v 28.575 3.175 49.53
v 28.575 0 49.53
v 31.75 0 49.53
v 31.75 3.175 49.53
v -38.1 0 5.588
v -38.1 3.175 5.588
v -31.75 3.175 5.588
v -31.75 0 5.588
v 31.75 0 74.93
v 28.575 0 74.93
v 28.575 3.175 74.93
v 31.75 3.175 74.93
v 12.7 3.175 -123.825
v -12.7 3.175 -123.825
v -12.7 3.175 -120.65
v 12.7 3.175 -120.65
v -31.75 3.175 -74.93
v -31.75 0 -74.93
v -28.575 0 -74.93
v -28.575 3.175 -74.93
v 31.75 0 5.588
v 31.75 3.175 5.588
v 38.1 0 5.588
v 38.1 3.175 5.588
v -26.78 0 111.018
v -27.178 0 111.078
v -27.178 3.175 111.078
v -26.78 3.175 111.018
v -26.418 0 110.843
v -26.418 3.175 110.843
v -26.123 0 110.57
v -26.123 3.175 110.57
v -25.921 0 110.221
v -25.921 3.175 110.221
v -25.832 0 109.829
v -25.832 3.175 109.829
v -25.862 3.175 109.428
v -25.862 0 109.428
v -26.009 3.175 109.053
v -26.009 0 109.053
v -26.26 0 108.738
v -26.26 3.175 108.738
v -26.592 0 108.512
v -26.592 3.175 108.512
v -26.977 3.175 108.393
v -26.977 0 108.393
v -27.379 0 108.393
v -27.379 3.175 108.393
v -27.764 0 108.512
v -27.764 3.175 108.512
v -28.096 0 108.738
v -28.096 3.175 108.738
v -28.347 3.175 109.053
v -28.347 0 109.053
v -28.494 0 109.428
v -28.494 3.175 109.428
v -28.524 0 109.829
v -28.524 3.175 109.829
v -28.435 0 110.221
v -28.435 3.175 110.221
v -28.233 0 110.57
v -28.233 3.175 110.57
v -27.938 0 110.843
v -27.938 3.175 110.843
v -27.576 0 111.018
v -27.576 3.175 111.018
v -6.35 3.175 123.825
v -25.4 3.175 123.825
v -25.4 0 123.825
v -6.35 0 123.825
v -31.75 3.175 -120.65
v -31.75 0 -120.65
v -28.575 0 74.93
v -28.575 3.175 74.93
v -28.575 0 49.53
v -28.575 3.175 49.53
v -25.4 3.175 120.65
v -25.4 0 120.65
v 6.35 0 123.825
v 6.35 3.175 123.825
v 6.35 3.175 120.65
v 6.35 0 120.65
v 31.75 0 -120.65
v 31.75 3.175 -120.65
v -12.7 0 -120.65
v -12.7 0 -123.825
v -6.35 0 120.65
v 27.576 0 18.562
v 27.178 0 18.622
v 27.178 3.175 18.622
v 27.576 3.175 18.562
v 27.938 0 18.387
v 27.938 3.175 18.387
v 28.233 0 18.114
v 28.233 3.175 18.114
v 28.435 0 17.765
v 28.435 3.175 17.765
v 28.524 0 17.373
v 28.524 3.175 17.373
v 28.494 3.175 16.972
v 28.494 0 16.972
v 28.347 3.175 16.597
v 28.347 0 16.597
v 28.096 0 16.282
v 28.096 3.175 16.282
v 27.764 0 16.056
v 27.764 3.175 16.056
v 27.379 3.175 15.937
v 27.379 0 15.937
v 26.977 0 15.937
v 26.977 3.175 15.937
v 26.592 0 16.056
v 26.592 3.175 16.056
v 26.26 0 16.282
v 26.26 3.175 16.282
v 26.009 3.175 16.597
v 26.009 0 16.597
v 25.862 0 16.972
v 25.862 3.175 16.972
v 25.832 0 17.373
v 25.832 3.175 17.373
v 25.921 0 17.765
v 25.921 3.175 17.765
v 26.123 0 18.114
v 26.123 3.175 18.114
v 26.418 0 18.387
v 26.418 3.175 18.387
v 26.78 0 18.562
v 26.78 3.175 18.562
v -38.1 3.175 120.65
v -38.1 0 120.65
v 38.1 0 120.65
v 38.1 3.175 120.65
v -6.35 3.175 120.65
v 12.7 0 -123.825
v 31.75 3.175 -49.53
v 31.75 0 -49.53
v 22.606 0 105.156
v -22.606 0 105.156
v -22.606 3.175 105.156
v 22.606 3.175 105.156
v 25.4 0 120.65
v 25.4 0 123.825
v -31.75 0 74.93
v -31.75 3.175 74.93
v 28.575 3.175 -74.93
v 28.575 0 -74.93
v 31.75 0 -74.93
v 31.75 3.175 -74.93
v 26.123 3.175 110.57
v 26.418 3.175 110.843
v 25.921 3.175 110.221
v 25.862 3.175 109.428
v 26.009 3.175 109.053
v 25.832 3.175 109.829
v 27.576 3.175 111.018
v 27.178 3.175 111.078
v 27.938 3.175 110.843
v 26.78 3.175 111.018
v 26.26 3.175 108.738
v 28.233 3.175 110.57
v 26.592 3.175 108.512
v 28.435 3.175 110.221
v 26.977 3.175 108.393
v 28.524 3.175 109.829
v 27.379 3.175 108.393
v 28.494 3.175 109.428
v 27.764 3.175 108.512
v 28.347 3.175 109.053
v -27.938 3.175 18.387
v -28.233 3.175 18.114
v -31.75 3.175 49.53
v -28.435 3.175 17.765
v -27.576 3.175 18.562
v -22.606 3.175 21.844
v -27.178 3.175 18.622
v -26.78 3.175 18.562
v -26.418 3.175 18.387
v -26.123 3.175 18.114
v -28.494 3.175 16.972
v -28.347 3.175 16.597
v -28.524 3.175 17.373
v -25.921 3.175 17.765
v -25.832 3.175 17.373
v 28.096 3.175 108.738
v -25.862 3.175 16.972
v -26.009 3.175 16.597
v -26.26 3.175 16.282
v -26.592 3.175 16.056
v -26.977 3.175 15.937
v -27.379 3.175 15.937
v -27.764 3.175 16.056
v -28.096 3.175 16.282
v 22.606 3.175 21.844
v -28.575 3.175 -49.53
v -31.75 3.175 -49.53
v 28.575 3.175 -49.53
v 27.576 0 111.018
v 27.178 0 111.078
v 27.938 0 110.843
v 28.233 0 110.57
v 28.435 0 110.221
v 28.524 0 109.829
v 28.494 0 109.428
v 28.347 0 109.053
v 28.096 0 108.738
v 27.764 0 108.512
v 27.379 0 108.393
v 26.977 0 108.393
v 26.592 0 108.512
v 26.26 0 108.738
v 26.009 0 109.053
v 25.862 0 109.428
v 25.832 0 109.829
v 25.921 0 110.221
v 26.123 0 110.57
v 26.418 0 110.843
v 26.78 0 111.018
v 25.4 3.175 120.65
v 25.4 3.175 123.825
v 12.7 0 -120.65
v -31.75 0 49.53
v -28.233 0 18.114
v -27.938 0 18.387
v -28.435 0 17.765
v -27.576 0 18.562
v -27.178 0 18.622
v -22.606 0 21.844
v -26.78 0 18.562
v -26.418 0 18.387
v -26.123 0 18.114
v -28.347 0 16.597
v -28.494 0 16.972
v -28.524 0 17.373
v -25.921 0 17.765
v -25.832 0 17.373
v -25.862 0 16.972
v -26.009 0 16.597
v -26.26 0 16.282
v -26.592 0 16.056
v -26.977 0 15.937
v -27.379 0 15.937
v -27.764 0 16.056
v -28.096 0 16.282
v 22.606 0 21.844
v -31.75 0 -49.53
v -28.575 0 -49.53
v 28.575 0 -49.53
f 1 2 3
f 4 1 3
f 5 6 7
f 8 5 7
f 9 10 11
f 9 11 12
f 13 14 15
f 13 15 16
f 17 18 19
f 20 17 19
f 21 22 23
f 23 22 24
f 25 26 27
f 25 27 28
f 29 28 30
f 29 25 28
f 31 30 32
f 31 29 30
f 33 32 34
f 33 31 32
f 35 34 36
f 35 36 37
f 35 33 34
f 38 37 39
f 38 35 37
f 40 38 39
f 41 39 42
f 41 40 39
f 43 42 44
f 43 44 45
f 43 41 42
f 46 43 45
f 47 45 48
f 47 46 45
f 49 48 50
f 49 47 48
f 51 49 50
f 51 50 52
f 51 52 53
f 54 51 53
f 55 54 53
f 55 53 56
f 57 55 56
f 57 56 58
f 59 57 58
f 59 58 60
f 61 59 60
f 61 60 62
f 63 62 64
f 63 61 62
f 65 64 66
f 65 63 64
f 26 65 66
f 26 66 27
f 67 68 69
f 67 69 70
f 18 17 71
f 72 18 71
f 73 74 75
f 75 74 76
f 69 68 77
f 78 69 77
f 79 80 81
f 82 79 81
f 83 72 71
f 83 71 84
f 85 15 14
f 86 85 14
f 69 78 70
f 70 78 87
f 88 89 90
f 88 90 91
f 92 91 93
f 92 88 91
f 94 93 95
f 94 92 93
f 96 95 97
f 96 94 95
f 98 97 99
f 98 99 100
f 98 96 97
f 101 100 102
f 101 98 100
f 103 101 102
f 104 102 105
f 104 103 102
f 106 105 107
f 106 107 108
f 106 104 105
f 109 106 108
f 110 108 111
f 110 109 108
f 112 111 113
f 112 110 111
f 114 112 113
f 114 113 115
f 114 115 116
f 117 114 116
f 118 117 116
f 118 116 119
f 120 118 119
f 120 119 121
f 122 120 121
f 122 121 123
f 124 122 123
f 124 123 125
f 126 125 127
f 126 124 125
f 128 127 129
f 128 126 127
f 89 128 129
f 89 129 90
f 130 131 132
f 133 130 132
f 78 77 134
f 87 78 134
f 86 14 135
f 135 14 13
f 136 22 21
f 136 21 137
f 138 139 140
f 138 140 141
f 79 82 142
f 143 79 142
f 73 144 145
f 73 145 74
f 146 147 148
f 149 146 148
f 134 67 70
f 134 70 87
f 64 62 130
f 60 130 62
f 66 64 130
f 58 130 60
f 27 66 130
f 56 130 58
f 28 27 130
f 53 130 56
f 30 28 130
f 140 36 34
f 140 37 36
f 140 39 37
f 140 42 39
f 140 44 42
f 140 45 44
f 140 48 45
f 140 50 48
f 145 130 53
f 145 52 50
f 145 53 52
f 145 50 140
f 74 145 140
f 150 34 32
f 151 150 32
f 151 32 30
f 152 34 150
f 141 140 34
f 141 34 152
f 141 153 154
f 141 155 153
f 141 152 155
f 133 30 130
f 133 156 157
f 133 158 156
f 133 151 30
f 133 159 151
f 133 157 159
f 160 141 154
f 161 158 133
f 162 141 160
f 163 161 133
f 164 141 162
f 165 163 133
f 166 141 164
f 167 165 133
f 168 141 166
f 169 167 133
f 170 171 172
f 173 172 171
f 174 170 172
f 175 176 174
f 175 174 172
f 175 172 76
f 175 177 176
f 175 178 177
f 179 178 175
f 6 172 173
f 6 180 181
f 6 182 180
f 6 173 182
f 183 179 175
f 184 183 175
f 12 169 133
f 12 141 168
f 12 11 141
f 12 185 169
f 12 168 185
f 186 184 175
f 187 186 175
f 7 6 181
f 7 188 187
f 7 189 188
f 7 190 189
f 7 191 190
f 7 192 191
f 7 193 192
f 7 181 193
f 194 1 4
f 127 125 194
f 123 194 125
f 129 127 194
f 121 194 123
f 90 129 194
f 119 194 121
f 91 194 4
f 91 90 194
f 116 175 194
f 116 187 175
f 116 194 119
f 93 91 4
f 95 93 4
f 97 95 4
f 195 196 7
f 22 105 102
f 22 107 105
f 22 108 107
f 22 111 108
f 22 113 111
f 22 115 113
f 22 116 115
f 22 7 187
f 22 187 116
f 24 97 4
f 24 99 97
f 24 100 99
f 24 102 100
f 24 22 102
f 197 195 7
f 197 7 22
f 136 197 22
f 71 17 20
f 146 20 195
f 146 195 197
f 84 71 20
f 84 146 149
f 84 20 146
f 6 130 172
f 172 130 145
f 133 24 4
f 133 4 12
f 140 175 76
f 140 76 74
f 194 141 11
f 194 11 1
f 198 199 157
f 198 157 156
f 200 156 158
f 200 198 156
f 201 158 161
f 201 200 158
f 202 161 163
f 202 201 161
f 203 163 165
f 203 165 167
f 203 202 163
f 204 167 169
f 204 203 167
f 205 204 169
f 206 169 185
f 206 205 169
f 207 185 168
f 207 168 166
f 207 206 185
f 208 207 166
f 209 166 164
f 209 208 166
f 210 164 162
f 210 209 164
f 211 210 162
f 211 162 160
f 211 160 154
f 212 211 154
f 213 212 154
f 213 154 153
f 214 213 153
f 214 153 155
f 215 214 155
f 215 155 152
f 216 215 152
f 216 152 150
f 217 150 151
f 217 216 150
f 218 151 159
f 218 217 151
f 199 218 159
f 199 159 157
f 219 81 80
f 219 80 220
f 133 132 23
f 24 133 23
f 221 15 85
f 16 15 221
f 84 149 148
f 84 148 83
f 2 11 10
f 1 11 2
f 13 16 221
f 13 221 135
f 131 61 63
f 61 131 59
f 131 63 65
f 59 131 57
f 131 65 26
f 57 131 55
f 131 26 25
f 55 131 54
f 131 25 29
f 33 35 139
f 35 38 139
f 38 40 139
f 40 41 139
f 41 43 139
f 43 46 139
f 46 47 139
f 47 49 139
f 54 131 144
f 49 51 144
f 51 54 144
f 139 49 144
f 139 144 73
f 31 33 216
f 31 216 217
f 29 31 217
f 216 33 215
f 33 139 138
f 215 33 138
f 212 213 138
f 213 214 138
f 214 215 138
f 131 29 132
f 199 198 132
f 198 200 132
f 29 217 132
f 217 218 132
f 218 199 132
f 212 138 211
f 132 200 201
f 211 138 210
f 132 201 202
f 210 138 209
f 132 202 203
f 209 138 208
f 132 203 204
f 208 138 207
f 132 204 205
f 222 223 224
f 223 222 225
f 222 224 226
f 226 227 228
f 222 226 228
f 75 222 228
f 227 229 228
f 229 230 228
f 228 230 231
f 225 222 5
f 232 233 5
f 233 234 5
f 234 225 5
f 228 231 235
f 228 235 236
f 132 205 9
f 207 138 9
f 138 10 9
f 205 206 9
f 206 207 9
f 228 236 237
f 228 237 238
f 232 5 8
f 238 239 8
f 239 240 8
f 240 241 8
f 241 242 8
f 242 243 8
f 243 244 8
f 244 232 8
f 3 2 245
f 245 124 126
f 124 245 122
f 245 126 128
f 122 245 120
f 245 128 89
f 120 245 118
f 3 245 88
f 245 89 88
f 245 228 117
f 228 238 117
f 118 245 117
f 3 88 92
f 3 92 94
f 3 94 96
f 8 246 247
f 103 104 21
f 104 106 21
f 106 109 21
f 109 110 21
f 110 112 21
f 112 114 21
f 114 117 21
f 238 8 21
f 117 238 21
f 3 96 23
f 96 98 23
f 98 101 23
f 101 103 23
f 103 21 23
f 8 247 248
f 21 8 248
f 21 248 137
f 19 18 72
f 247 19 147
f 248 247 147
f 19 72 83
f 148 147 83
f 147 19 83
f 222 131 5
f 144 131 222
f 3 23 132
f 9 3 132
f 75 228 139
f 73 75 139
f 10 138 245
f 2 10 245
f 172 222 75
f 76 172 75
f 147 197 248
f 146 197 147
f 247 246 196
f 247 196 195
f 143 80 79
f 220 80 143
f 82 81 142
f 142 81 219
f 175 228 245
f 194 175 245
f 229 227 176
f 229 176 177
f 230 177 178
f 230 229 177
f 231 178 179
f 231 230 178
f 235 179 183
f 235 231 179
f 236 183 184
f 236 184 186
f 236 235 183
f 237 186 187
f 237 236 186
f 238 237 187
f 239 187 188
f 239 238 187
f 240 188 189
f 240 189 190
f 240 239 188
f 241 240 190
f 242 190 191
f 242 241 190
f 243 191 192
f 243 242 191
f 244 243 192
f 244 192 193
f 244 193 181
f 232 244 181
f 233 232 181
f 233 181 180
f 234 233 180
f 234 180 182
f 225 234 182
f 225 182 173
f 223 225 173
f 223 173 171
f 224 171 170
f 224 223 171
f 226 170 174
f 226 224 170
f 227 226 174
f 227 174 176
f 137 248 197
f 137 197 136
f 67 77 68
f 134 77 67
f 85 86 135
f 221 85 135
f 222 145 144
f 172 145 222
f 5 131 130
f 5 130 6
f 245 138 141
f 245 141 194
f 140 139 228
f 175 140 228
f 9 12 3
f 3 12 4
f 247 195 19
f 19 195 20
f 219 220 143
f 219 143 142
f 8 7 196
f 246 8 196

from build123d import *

# Parameters (mm, degrees)
SKETCH1_W             = 76.2
SKETCH1_H             = 241.3
BOSS_EXTRUDE1_DEPTH   = 3.175
SKETCH1_3_W           = 45.212
SKETCH1_3_H           = 83.312
CUT_EXTRUDE2_DEPTH    = 3.175
SKETCH1_5_R           = 1.3499973
CUT_EXTRUDE5_DEPTH    = 3.175
SKETCH1_6_R           = 1.3499973
CUT_EXTRUDE6_DEPTH    = 3.175
SKETCH1_7_R           = 1.3499973
CUT_EXTRUDE7_DEPTH    = 3.175
SKETCH1_8_R           = 1.3499973
CUT_EXTRUDE9_DEPTH    = 3.175
SKETCH5_W             = 6.35
SKETCH5_H             = 126.238
CUT_EXTRUDE11_DEPTH   = 3.175
SKETCH5_4_W           = 6.35
SKETCH5_4_H           = 126.238
CUT_EXTRUDE12_DEPTH   = 3.175
SKETCH7_W             = 3.175
SKETCH7_H             = 25.4
CUT_EXTRUDE13_DEPTH   = 3.175
SKETCH7_3_W           = 3.175
SKETCH7_3_H           = 25.4
CUT_EXTRUDE14_DEPTH   = 3.175
SKETCH8_W             = 19.05
SKETCH8_H             = 3.175
BOSS_EXTRUDE2_DEPTH   = 3.175
BOSS_EXTRUDE2_2_DEPTH = 3.175
SKETCH8_W_2           = 25.4
BOSS_EXTRUDE2_3_DEPTH = 3.175


with BuildPart() as part:
    # Sketch1 → Boss-Extrude1 (new body)
    with BuildSketch(Plane(origin=(0, 0, 0), x_dir=(1, 0, 0), z_dir=(0, 1, 0))):
        Rectangle(SKETCH1_W, SKETCH1_H)
    extrude(amount=BOSS_EXTRUDE1_DEPTH)

    # Sketch1<3> → Cut-Extrude2 (cut)
    with BuildSketch(Plane(origin=(0, 0, 0), x_dir=(1, 0, 0), z_dir=(0, 1, 0))):
        with Locations((0, -63.5)):
            Rectangle(SKETCH1_3_W, SKETCH1_3_H)
    extrude(amount=CUT_EXTRUDE2_DEPTH, mode=Mode.SUBTRACT)

    # Sketch1<5> → Cut-Extrude5 (cut)
    with BuildSketch(Plane(origin=(0, 0, 0), x_dir=(1, 0, 0), z_dir=(0, 1, 0))):
        with Locations((-27.178, -17.272)):
            Circle(SKETCH1_5_R)
    extrude(amount=CUT_EXTRUDE5_DEPTH, mode=Mode.SUBTRACT)

    # Sketch1<6> → Cut-Extrude6 (cut)
    with BuildSketch(Plane(origin=(0, 0, 0), x_dir=(1, 0, 0), z_dir=(0, 1, 0))):
        with Locations((27.178, -17.272)):
            Circle(SKETCH1_6_R)
    extrude(amount=CUT_EXTRUDE6_DEPTH, mode=Mode.SUBTRACT)

    # Sketch1<7> → Cut-Extrude7 (cut)
    with BuildSketch(Plane(origin=(0, 0, 0), x_dir=(1, 0, 0), z_dir=(0, 1, 0))):
        with Locations((-27.178, -109.728)):
            Circle(SKETCH1_7_R)
    extrude(amount=CUT_EXTRUDE7_DEPTH, mode=Mode.SUBTRACT)

    # Sketch1<8> → Cut-Extrude9 (cut)
    with BuildSketch(Plane(origin=(0, 0, 0), x_dir=(1, 0, 0), z_dir=(0, 1, 0))):
        with Locations((27.178, -109.728)):
            Circle(SKETCH1_8_R)
    extrude(amount=CUT_EXTRUDE9_DEPTH, mode=Mode.SUBTRACT)

    # Sketch5 → Cut-Extrude11 (cut)
    with BuildSketch(Plane(origin=(0, 3.175, 0), x_dir=(1, 0, 0), z_dir=(0, 1, 0))):
        with Locations((-34.925, 57.531)):
            Rectangle(SKETCH5_W, SKETCH5_H)
    extrude(amount=-CUT_EXTRUDE11_DEPTH, mode=Mode.SUBTRACT)

    # Sketch5<4> → Cut-Extrude12 (cut)
    with BuildSketch(Plane(origin=(0, 3.175, 0), x_dir=(1, 0, 0), z_dir=(0, 1, 0))):
        with Locations((34.925, 57.531)):
            Rectangle(SKETCH5_4_W, SKETCH5_4_H)
    extrude(amount=-CUT_EXTRUDE12_DEPTH, mode=Mode.SUBTRACT)

    # Sketch7 → Cut-Extrude13 (cut)
    with BuildSketch(Plane(origin=(0, 3.175, 0), x_dir=(1, 0, 0), z_dir=(0, 1, 0))):
        with Locations((-30.1625, -62.23)):
            Rectangle(SKETCH7_W, SKETCH7_H)
    extrude(amount=-CUT_EXTRUDE13_DEPTH, mode=Mode.SUBTRACT)

    # Sketch7<3> → Cut-Extrude14 (cut)
    with BuildSketch(Plane(origin=(0, 3.175, 0), x_dir=(1, 0, 0), z_dir=(0, 1, 0))):
        with Locations((-30.1625, -62.23)):
            Rectangle(SKETCH7_3_W, SKETCH7_3_H)
        with Locations((30.1625, -62.23)):
            Rectangle(SKETCH7_3_W, SKETCH7_3_H)
        with Locations((-30.1625, 62.23)):
            Rectangle(SKETCH7_3_W, SKETCH7_3_H)
        with Locations((30.1625, 62.23)):
            Rectangle(SKETCH7_3_W, SKETCH7_3_H)
    extrude(amount=-CUT_EXTRUDE14_DEPTH, mode=Mode.SUBTRACT)


with BuildPart() as body_2:
    # Sketch8 → Boss-Extrude2 (new body)
    with BuildSketch(Plane(origin=(0, 3.175, 0), x_dir=(1, 0, 0), z_dir=(0, 1, 0))):
        with Locations((-15.875, -122.2375)):
            Rectangle(SKETCH8_W, SKETCH8_H)
    extrude(amount=-BOSS_EXTRUDE2_DEPTH)


with BuildPart() as body_3:
    # Sketch8 → Boss-Extrude2 2 (new body)
    with BuildSketch(Plane(origin=(0, 3.175, 0), x_dir=(1, 0, 0), z_dir=(0, 1, 0))):
        with Locations((15.875, -122.2375)):
            Rectangle(SKETCH8_W, SKETCH8_H)
    extrude(amount=-BOSS_EXTRUDE2_2_DEPTH)


with BuildPart() as body_4:
    # Sketch8 → Boss-Extrude2 3 (new body)
    with BuildSketch(Plane(origin=(0, 3.175, 0), x_dir=(1, 0, 0), z_dir=(0, 1, 0))):
        with Locations((0, 122.2375)):
            Rectangle(SKETCH8_W_2, SKETCH8_H)
    extrude(amount=-BOSS_EXTRUDE2_3_DEPTH)


solid = Compound([part.part, body_2.part, body_3.part, body_4.part])
